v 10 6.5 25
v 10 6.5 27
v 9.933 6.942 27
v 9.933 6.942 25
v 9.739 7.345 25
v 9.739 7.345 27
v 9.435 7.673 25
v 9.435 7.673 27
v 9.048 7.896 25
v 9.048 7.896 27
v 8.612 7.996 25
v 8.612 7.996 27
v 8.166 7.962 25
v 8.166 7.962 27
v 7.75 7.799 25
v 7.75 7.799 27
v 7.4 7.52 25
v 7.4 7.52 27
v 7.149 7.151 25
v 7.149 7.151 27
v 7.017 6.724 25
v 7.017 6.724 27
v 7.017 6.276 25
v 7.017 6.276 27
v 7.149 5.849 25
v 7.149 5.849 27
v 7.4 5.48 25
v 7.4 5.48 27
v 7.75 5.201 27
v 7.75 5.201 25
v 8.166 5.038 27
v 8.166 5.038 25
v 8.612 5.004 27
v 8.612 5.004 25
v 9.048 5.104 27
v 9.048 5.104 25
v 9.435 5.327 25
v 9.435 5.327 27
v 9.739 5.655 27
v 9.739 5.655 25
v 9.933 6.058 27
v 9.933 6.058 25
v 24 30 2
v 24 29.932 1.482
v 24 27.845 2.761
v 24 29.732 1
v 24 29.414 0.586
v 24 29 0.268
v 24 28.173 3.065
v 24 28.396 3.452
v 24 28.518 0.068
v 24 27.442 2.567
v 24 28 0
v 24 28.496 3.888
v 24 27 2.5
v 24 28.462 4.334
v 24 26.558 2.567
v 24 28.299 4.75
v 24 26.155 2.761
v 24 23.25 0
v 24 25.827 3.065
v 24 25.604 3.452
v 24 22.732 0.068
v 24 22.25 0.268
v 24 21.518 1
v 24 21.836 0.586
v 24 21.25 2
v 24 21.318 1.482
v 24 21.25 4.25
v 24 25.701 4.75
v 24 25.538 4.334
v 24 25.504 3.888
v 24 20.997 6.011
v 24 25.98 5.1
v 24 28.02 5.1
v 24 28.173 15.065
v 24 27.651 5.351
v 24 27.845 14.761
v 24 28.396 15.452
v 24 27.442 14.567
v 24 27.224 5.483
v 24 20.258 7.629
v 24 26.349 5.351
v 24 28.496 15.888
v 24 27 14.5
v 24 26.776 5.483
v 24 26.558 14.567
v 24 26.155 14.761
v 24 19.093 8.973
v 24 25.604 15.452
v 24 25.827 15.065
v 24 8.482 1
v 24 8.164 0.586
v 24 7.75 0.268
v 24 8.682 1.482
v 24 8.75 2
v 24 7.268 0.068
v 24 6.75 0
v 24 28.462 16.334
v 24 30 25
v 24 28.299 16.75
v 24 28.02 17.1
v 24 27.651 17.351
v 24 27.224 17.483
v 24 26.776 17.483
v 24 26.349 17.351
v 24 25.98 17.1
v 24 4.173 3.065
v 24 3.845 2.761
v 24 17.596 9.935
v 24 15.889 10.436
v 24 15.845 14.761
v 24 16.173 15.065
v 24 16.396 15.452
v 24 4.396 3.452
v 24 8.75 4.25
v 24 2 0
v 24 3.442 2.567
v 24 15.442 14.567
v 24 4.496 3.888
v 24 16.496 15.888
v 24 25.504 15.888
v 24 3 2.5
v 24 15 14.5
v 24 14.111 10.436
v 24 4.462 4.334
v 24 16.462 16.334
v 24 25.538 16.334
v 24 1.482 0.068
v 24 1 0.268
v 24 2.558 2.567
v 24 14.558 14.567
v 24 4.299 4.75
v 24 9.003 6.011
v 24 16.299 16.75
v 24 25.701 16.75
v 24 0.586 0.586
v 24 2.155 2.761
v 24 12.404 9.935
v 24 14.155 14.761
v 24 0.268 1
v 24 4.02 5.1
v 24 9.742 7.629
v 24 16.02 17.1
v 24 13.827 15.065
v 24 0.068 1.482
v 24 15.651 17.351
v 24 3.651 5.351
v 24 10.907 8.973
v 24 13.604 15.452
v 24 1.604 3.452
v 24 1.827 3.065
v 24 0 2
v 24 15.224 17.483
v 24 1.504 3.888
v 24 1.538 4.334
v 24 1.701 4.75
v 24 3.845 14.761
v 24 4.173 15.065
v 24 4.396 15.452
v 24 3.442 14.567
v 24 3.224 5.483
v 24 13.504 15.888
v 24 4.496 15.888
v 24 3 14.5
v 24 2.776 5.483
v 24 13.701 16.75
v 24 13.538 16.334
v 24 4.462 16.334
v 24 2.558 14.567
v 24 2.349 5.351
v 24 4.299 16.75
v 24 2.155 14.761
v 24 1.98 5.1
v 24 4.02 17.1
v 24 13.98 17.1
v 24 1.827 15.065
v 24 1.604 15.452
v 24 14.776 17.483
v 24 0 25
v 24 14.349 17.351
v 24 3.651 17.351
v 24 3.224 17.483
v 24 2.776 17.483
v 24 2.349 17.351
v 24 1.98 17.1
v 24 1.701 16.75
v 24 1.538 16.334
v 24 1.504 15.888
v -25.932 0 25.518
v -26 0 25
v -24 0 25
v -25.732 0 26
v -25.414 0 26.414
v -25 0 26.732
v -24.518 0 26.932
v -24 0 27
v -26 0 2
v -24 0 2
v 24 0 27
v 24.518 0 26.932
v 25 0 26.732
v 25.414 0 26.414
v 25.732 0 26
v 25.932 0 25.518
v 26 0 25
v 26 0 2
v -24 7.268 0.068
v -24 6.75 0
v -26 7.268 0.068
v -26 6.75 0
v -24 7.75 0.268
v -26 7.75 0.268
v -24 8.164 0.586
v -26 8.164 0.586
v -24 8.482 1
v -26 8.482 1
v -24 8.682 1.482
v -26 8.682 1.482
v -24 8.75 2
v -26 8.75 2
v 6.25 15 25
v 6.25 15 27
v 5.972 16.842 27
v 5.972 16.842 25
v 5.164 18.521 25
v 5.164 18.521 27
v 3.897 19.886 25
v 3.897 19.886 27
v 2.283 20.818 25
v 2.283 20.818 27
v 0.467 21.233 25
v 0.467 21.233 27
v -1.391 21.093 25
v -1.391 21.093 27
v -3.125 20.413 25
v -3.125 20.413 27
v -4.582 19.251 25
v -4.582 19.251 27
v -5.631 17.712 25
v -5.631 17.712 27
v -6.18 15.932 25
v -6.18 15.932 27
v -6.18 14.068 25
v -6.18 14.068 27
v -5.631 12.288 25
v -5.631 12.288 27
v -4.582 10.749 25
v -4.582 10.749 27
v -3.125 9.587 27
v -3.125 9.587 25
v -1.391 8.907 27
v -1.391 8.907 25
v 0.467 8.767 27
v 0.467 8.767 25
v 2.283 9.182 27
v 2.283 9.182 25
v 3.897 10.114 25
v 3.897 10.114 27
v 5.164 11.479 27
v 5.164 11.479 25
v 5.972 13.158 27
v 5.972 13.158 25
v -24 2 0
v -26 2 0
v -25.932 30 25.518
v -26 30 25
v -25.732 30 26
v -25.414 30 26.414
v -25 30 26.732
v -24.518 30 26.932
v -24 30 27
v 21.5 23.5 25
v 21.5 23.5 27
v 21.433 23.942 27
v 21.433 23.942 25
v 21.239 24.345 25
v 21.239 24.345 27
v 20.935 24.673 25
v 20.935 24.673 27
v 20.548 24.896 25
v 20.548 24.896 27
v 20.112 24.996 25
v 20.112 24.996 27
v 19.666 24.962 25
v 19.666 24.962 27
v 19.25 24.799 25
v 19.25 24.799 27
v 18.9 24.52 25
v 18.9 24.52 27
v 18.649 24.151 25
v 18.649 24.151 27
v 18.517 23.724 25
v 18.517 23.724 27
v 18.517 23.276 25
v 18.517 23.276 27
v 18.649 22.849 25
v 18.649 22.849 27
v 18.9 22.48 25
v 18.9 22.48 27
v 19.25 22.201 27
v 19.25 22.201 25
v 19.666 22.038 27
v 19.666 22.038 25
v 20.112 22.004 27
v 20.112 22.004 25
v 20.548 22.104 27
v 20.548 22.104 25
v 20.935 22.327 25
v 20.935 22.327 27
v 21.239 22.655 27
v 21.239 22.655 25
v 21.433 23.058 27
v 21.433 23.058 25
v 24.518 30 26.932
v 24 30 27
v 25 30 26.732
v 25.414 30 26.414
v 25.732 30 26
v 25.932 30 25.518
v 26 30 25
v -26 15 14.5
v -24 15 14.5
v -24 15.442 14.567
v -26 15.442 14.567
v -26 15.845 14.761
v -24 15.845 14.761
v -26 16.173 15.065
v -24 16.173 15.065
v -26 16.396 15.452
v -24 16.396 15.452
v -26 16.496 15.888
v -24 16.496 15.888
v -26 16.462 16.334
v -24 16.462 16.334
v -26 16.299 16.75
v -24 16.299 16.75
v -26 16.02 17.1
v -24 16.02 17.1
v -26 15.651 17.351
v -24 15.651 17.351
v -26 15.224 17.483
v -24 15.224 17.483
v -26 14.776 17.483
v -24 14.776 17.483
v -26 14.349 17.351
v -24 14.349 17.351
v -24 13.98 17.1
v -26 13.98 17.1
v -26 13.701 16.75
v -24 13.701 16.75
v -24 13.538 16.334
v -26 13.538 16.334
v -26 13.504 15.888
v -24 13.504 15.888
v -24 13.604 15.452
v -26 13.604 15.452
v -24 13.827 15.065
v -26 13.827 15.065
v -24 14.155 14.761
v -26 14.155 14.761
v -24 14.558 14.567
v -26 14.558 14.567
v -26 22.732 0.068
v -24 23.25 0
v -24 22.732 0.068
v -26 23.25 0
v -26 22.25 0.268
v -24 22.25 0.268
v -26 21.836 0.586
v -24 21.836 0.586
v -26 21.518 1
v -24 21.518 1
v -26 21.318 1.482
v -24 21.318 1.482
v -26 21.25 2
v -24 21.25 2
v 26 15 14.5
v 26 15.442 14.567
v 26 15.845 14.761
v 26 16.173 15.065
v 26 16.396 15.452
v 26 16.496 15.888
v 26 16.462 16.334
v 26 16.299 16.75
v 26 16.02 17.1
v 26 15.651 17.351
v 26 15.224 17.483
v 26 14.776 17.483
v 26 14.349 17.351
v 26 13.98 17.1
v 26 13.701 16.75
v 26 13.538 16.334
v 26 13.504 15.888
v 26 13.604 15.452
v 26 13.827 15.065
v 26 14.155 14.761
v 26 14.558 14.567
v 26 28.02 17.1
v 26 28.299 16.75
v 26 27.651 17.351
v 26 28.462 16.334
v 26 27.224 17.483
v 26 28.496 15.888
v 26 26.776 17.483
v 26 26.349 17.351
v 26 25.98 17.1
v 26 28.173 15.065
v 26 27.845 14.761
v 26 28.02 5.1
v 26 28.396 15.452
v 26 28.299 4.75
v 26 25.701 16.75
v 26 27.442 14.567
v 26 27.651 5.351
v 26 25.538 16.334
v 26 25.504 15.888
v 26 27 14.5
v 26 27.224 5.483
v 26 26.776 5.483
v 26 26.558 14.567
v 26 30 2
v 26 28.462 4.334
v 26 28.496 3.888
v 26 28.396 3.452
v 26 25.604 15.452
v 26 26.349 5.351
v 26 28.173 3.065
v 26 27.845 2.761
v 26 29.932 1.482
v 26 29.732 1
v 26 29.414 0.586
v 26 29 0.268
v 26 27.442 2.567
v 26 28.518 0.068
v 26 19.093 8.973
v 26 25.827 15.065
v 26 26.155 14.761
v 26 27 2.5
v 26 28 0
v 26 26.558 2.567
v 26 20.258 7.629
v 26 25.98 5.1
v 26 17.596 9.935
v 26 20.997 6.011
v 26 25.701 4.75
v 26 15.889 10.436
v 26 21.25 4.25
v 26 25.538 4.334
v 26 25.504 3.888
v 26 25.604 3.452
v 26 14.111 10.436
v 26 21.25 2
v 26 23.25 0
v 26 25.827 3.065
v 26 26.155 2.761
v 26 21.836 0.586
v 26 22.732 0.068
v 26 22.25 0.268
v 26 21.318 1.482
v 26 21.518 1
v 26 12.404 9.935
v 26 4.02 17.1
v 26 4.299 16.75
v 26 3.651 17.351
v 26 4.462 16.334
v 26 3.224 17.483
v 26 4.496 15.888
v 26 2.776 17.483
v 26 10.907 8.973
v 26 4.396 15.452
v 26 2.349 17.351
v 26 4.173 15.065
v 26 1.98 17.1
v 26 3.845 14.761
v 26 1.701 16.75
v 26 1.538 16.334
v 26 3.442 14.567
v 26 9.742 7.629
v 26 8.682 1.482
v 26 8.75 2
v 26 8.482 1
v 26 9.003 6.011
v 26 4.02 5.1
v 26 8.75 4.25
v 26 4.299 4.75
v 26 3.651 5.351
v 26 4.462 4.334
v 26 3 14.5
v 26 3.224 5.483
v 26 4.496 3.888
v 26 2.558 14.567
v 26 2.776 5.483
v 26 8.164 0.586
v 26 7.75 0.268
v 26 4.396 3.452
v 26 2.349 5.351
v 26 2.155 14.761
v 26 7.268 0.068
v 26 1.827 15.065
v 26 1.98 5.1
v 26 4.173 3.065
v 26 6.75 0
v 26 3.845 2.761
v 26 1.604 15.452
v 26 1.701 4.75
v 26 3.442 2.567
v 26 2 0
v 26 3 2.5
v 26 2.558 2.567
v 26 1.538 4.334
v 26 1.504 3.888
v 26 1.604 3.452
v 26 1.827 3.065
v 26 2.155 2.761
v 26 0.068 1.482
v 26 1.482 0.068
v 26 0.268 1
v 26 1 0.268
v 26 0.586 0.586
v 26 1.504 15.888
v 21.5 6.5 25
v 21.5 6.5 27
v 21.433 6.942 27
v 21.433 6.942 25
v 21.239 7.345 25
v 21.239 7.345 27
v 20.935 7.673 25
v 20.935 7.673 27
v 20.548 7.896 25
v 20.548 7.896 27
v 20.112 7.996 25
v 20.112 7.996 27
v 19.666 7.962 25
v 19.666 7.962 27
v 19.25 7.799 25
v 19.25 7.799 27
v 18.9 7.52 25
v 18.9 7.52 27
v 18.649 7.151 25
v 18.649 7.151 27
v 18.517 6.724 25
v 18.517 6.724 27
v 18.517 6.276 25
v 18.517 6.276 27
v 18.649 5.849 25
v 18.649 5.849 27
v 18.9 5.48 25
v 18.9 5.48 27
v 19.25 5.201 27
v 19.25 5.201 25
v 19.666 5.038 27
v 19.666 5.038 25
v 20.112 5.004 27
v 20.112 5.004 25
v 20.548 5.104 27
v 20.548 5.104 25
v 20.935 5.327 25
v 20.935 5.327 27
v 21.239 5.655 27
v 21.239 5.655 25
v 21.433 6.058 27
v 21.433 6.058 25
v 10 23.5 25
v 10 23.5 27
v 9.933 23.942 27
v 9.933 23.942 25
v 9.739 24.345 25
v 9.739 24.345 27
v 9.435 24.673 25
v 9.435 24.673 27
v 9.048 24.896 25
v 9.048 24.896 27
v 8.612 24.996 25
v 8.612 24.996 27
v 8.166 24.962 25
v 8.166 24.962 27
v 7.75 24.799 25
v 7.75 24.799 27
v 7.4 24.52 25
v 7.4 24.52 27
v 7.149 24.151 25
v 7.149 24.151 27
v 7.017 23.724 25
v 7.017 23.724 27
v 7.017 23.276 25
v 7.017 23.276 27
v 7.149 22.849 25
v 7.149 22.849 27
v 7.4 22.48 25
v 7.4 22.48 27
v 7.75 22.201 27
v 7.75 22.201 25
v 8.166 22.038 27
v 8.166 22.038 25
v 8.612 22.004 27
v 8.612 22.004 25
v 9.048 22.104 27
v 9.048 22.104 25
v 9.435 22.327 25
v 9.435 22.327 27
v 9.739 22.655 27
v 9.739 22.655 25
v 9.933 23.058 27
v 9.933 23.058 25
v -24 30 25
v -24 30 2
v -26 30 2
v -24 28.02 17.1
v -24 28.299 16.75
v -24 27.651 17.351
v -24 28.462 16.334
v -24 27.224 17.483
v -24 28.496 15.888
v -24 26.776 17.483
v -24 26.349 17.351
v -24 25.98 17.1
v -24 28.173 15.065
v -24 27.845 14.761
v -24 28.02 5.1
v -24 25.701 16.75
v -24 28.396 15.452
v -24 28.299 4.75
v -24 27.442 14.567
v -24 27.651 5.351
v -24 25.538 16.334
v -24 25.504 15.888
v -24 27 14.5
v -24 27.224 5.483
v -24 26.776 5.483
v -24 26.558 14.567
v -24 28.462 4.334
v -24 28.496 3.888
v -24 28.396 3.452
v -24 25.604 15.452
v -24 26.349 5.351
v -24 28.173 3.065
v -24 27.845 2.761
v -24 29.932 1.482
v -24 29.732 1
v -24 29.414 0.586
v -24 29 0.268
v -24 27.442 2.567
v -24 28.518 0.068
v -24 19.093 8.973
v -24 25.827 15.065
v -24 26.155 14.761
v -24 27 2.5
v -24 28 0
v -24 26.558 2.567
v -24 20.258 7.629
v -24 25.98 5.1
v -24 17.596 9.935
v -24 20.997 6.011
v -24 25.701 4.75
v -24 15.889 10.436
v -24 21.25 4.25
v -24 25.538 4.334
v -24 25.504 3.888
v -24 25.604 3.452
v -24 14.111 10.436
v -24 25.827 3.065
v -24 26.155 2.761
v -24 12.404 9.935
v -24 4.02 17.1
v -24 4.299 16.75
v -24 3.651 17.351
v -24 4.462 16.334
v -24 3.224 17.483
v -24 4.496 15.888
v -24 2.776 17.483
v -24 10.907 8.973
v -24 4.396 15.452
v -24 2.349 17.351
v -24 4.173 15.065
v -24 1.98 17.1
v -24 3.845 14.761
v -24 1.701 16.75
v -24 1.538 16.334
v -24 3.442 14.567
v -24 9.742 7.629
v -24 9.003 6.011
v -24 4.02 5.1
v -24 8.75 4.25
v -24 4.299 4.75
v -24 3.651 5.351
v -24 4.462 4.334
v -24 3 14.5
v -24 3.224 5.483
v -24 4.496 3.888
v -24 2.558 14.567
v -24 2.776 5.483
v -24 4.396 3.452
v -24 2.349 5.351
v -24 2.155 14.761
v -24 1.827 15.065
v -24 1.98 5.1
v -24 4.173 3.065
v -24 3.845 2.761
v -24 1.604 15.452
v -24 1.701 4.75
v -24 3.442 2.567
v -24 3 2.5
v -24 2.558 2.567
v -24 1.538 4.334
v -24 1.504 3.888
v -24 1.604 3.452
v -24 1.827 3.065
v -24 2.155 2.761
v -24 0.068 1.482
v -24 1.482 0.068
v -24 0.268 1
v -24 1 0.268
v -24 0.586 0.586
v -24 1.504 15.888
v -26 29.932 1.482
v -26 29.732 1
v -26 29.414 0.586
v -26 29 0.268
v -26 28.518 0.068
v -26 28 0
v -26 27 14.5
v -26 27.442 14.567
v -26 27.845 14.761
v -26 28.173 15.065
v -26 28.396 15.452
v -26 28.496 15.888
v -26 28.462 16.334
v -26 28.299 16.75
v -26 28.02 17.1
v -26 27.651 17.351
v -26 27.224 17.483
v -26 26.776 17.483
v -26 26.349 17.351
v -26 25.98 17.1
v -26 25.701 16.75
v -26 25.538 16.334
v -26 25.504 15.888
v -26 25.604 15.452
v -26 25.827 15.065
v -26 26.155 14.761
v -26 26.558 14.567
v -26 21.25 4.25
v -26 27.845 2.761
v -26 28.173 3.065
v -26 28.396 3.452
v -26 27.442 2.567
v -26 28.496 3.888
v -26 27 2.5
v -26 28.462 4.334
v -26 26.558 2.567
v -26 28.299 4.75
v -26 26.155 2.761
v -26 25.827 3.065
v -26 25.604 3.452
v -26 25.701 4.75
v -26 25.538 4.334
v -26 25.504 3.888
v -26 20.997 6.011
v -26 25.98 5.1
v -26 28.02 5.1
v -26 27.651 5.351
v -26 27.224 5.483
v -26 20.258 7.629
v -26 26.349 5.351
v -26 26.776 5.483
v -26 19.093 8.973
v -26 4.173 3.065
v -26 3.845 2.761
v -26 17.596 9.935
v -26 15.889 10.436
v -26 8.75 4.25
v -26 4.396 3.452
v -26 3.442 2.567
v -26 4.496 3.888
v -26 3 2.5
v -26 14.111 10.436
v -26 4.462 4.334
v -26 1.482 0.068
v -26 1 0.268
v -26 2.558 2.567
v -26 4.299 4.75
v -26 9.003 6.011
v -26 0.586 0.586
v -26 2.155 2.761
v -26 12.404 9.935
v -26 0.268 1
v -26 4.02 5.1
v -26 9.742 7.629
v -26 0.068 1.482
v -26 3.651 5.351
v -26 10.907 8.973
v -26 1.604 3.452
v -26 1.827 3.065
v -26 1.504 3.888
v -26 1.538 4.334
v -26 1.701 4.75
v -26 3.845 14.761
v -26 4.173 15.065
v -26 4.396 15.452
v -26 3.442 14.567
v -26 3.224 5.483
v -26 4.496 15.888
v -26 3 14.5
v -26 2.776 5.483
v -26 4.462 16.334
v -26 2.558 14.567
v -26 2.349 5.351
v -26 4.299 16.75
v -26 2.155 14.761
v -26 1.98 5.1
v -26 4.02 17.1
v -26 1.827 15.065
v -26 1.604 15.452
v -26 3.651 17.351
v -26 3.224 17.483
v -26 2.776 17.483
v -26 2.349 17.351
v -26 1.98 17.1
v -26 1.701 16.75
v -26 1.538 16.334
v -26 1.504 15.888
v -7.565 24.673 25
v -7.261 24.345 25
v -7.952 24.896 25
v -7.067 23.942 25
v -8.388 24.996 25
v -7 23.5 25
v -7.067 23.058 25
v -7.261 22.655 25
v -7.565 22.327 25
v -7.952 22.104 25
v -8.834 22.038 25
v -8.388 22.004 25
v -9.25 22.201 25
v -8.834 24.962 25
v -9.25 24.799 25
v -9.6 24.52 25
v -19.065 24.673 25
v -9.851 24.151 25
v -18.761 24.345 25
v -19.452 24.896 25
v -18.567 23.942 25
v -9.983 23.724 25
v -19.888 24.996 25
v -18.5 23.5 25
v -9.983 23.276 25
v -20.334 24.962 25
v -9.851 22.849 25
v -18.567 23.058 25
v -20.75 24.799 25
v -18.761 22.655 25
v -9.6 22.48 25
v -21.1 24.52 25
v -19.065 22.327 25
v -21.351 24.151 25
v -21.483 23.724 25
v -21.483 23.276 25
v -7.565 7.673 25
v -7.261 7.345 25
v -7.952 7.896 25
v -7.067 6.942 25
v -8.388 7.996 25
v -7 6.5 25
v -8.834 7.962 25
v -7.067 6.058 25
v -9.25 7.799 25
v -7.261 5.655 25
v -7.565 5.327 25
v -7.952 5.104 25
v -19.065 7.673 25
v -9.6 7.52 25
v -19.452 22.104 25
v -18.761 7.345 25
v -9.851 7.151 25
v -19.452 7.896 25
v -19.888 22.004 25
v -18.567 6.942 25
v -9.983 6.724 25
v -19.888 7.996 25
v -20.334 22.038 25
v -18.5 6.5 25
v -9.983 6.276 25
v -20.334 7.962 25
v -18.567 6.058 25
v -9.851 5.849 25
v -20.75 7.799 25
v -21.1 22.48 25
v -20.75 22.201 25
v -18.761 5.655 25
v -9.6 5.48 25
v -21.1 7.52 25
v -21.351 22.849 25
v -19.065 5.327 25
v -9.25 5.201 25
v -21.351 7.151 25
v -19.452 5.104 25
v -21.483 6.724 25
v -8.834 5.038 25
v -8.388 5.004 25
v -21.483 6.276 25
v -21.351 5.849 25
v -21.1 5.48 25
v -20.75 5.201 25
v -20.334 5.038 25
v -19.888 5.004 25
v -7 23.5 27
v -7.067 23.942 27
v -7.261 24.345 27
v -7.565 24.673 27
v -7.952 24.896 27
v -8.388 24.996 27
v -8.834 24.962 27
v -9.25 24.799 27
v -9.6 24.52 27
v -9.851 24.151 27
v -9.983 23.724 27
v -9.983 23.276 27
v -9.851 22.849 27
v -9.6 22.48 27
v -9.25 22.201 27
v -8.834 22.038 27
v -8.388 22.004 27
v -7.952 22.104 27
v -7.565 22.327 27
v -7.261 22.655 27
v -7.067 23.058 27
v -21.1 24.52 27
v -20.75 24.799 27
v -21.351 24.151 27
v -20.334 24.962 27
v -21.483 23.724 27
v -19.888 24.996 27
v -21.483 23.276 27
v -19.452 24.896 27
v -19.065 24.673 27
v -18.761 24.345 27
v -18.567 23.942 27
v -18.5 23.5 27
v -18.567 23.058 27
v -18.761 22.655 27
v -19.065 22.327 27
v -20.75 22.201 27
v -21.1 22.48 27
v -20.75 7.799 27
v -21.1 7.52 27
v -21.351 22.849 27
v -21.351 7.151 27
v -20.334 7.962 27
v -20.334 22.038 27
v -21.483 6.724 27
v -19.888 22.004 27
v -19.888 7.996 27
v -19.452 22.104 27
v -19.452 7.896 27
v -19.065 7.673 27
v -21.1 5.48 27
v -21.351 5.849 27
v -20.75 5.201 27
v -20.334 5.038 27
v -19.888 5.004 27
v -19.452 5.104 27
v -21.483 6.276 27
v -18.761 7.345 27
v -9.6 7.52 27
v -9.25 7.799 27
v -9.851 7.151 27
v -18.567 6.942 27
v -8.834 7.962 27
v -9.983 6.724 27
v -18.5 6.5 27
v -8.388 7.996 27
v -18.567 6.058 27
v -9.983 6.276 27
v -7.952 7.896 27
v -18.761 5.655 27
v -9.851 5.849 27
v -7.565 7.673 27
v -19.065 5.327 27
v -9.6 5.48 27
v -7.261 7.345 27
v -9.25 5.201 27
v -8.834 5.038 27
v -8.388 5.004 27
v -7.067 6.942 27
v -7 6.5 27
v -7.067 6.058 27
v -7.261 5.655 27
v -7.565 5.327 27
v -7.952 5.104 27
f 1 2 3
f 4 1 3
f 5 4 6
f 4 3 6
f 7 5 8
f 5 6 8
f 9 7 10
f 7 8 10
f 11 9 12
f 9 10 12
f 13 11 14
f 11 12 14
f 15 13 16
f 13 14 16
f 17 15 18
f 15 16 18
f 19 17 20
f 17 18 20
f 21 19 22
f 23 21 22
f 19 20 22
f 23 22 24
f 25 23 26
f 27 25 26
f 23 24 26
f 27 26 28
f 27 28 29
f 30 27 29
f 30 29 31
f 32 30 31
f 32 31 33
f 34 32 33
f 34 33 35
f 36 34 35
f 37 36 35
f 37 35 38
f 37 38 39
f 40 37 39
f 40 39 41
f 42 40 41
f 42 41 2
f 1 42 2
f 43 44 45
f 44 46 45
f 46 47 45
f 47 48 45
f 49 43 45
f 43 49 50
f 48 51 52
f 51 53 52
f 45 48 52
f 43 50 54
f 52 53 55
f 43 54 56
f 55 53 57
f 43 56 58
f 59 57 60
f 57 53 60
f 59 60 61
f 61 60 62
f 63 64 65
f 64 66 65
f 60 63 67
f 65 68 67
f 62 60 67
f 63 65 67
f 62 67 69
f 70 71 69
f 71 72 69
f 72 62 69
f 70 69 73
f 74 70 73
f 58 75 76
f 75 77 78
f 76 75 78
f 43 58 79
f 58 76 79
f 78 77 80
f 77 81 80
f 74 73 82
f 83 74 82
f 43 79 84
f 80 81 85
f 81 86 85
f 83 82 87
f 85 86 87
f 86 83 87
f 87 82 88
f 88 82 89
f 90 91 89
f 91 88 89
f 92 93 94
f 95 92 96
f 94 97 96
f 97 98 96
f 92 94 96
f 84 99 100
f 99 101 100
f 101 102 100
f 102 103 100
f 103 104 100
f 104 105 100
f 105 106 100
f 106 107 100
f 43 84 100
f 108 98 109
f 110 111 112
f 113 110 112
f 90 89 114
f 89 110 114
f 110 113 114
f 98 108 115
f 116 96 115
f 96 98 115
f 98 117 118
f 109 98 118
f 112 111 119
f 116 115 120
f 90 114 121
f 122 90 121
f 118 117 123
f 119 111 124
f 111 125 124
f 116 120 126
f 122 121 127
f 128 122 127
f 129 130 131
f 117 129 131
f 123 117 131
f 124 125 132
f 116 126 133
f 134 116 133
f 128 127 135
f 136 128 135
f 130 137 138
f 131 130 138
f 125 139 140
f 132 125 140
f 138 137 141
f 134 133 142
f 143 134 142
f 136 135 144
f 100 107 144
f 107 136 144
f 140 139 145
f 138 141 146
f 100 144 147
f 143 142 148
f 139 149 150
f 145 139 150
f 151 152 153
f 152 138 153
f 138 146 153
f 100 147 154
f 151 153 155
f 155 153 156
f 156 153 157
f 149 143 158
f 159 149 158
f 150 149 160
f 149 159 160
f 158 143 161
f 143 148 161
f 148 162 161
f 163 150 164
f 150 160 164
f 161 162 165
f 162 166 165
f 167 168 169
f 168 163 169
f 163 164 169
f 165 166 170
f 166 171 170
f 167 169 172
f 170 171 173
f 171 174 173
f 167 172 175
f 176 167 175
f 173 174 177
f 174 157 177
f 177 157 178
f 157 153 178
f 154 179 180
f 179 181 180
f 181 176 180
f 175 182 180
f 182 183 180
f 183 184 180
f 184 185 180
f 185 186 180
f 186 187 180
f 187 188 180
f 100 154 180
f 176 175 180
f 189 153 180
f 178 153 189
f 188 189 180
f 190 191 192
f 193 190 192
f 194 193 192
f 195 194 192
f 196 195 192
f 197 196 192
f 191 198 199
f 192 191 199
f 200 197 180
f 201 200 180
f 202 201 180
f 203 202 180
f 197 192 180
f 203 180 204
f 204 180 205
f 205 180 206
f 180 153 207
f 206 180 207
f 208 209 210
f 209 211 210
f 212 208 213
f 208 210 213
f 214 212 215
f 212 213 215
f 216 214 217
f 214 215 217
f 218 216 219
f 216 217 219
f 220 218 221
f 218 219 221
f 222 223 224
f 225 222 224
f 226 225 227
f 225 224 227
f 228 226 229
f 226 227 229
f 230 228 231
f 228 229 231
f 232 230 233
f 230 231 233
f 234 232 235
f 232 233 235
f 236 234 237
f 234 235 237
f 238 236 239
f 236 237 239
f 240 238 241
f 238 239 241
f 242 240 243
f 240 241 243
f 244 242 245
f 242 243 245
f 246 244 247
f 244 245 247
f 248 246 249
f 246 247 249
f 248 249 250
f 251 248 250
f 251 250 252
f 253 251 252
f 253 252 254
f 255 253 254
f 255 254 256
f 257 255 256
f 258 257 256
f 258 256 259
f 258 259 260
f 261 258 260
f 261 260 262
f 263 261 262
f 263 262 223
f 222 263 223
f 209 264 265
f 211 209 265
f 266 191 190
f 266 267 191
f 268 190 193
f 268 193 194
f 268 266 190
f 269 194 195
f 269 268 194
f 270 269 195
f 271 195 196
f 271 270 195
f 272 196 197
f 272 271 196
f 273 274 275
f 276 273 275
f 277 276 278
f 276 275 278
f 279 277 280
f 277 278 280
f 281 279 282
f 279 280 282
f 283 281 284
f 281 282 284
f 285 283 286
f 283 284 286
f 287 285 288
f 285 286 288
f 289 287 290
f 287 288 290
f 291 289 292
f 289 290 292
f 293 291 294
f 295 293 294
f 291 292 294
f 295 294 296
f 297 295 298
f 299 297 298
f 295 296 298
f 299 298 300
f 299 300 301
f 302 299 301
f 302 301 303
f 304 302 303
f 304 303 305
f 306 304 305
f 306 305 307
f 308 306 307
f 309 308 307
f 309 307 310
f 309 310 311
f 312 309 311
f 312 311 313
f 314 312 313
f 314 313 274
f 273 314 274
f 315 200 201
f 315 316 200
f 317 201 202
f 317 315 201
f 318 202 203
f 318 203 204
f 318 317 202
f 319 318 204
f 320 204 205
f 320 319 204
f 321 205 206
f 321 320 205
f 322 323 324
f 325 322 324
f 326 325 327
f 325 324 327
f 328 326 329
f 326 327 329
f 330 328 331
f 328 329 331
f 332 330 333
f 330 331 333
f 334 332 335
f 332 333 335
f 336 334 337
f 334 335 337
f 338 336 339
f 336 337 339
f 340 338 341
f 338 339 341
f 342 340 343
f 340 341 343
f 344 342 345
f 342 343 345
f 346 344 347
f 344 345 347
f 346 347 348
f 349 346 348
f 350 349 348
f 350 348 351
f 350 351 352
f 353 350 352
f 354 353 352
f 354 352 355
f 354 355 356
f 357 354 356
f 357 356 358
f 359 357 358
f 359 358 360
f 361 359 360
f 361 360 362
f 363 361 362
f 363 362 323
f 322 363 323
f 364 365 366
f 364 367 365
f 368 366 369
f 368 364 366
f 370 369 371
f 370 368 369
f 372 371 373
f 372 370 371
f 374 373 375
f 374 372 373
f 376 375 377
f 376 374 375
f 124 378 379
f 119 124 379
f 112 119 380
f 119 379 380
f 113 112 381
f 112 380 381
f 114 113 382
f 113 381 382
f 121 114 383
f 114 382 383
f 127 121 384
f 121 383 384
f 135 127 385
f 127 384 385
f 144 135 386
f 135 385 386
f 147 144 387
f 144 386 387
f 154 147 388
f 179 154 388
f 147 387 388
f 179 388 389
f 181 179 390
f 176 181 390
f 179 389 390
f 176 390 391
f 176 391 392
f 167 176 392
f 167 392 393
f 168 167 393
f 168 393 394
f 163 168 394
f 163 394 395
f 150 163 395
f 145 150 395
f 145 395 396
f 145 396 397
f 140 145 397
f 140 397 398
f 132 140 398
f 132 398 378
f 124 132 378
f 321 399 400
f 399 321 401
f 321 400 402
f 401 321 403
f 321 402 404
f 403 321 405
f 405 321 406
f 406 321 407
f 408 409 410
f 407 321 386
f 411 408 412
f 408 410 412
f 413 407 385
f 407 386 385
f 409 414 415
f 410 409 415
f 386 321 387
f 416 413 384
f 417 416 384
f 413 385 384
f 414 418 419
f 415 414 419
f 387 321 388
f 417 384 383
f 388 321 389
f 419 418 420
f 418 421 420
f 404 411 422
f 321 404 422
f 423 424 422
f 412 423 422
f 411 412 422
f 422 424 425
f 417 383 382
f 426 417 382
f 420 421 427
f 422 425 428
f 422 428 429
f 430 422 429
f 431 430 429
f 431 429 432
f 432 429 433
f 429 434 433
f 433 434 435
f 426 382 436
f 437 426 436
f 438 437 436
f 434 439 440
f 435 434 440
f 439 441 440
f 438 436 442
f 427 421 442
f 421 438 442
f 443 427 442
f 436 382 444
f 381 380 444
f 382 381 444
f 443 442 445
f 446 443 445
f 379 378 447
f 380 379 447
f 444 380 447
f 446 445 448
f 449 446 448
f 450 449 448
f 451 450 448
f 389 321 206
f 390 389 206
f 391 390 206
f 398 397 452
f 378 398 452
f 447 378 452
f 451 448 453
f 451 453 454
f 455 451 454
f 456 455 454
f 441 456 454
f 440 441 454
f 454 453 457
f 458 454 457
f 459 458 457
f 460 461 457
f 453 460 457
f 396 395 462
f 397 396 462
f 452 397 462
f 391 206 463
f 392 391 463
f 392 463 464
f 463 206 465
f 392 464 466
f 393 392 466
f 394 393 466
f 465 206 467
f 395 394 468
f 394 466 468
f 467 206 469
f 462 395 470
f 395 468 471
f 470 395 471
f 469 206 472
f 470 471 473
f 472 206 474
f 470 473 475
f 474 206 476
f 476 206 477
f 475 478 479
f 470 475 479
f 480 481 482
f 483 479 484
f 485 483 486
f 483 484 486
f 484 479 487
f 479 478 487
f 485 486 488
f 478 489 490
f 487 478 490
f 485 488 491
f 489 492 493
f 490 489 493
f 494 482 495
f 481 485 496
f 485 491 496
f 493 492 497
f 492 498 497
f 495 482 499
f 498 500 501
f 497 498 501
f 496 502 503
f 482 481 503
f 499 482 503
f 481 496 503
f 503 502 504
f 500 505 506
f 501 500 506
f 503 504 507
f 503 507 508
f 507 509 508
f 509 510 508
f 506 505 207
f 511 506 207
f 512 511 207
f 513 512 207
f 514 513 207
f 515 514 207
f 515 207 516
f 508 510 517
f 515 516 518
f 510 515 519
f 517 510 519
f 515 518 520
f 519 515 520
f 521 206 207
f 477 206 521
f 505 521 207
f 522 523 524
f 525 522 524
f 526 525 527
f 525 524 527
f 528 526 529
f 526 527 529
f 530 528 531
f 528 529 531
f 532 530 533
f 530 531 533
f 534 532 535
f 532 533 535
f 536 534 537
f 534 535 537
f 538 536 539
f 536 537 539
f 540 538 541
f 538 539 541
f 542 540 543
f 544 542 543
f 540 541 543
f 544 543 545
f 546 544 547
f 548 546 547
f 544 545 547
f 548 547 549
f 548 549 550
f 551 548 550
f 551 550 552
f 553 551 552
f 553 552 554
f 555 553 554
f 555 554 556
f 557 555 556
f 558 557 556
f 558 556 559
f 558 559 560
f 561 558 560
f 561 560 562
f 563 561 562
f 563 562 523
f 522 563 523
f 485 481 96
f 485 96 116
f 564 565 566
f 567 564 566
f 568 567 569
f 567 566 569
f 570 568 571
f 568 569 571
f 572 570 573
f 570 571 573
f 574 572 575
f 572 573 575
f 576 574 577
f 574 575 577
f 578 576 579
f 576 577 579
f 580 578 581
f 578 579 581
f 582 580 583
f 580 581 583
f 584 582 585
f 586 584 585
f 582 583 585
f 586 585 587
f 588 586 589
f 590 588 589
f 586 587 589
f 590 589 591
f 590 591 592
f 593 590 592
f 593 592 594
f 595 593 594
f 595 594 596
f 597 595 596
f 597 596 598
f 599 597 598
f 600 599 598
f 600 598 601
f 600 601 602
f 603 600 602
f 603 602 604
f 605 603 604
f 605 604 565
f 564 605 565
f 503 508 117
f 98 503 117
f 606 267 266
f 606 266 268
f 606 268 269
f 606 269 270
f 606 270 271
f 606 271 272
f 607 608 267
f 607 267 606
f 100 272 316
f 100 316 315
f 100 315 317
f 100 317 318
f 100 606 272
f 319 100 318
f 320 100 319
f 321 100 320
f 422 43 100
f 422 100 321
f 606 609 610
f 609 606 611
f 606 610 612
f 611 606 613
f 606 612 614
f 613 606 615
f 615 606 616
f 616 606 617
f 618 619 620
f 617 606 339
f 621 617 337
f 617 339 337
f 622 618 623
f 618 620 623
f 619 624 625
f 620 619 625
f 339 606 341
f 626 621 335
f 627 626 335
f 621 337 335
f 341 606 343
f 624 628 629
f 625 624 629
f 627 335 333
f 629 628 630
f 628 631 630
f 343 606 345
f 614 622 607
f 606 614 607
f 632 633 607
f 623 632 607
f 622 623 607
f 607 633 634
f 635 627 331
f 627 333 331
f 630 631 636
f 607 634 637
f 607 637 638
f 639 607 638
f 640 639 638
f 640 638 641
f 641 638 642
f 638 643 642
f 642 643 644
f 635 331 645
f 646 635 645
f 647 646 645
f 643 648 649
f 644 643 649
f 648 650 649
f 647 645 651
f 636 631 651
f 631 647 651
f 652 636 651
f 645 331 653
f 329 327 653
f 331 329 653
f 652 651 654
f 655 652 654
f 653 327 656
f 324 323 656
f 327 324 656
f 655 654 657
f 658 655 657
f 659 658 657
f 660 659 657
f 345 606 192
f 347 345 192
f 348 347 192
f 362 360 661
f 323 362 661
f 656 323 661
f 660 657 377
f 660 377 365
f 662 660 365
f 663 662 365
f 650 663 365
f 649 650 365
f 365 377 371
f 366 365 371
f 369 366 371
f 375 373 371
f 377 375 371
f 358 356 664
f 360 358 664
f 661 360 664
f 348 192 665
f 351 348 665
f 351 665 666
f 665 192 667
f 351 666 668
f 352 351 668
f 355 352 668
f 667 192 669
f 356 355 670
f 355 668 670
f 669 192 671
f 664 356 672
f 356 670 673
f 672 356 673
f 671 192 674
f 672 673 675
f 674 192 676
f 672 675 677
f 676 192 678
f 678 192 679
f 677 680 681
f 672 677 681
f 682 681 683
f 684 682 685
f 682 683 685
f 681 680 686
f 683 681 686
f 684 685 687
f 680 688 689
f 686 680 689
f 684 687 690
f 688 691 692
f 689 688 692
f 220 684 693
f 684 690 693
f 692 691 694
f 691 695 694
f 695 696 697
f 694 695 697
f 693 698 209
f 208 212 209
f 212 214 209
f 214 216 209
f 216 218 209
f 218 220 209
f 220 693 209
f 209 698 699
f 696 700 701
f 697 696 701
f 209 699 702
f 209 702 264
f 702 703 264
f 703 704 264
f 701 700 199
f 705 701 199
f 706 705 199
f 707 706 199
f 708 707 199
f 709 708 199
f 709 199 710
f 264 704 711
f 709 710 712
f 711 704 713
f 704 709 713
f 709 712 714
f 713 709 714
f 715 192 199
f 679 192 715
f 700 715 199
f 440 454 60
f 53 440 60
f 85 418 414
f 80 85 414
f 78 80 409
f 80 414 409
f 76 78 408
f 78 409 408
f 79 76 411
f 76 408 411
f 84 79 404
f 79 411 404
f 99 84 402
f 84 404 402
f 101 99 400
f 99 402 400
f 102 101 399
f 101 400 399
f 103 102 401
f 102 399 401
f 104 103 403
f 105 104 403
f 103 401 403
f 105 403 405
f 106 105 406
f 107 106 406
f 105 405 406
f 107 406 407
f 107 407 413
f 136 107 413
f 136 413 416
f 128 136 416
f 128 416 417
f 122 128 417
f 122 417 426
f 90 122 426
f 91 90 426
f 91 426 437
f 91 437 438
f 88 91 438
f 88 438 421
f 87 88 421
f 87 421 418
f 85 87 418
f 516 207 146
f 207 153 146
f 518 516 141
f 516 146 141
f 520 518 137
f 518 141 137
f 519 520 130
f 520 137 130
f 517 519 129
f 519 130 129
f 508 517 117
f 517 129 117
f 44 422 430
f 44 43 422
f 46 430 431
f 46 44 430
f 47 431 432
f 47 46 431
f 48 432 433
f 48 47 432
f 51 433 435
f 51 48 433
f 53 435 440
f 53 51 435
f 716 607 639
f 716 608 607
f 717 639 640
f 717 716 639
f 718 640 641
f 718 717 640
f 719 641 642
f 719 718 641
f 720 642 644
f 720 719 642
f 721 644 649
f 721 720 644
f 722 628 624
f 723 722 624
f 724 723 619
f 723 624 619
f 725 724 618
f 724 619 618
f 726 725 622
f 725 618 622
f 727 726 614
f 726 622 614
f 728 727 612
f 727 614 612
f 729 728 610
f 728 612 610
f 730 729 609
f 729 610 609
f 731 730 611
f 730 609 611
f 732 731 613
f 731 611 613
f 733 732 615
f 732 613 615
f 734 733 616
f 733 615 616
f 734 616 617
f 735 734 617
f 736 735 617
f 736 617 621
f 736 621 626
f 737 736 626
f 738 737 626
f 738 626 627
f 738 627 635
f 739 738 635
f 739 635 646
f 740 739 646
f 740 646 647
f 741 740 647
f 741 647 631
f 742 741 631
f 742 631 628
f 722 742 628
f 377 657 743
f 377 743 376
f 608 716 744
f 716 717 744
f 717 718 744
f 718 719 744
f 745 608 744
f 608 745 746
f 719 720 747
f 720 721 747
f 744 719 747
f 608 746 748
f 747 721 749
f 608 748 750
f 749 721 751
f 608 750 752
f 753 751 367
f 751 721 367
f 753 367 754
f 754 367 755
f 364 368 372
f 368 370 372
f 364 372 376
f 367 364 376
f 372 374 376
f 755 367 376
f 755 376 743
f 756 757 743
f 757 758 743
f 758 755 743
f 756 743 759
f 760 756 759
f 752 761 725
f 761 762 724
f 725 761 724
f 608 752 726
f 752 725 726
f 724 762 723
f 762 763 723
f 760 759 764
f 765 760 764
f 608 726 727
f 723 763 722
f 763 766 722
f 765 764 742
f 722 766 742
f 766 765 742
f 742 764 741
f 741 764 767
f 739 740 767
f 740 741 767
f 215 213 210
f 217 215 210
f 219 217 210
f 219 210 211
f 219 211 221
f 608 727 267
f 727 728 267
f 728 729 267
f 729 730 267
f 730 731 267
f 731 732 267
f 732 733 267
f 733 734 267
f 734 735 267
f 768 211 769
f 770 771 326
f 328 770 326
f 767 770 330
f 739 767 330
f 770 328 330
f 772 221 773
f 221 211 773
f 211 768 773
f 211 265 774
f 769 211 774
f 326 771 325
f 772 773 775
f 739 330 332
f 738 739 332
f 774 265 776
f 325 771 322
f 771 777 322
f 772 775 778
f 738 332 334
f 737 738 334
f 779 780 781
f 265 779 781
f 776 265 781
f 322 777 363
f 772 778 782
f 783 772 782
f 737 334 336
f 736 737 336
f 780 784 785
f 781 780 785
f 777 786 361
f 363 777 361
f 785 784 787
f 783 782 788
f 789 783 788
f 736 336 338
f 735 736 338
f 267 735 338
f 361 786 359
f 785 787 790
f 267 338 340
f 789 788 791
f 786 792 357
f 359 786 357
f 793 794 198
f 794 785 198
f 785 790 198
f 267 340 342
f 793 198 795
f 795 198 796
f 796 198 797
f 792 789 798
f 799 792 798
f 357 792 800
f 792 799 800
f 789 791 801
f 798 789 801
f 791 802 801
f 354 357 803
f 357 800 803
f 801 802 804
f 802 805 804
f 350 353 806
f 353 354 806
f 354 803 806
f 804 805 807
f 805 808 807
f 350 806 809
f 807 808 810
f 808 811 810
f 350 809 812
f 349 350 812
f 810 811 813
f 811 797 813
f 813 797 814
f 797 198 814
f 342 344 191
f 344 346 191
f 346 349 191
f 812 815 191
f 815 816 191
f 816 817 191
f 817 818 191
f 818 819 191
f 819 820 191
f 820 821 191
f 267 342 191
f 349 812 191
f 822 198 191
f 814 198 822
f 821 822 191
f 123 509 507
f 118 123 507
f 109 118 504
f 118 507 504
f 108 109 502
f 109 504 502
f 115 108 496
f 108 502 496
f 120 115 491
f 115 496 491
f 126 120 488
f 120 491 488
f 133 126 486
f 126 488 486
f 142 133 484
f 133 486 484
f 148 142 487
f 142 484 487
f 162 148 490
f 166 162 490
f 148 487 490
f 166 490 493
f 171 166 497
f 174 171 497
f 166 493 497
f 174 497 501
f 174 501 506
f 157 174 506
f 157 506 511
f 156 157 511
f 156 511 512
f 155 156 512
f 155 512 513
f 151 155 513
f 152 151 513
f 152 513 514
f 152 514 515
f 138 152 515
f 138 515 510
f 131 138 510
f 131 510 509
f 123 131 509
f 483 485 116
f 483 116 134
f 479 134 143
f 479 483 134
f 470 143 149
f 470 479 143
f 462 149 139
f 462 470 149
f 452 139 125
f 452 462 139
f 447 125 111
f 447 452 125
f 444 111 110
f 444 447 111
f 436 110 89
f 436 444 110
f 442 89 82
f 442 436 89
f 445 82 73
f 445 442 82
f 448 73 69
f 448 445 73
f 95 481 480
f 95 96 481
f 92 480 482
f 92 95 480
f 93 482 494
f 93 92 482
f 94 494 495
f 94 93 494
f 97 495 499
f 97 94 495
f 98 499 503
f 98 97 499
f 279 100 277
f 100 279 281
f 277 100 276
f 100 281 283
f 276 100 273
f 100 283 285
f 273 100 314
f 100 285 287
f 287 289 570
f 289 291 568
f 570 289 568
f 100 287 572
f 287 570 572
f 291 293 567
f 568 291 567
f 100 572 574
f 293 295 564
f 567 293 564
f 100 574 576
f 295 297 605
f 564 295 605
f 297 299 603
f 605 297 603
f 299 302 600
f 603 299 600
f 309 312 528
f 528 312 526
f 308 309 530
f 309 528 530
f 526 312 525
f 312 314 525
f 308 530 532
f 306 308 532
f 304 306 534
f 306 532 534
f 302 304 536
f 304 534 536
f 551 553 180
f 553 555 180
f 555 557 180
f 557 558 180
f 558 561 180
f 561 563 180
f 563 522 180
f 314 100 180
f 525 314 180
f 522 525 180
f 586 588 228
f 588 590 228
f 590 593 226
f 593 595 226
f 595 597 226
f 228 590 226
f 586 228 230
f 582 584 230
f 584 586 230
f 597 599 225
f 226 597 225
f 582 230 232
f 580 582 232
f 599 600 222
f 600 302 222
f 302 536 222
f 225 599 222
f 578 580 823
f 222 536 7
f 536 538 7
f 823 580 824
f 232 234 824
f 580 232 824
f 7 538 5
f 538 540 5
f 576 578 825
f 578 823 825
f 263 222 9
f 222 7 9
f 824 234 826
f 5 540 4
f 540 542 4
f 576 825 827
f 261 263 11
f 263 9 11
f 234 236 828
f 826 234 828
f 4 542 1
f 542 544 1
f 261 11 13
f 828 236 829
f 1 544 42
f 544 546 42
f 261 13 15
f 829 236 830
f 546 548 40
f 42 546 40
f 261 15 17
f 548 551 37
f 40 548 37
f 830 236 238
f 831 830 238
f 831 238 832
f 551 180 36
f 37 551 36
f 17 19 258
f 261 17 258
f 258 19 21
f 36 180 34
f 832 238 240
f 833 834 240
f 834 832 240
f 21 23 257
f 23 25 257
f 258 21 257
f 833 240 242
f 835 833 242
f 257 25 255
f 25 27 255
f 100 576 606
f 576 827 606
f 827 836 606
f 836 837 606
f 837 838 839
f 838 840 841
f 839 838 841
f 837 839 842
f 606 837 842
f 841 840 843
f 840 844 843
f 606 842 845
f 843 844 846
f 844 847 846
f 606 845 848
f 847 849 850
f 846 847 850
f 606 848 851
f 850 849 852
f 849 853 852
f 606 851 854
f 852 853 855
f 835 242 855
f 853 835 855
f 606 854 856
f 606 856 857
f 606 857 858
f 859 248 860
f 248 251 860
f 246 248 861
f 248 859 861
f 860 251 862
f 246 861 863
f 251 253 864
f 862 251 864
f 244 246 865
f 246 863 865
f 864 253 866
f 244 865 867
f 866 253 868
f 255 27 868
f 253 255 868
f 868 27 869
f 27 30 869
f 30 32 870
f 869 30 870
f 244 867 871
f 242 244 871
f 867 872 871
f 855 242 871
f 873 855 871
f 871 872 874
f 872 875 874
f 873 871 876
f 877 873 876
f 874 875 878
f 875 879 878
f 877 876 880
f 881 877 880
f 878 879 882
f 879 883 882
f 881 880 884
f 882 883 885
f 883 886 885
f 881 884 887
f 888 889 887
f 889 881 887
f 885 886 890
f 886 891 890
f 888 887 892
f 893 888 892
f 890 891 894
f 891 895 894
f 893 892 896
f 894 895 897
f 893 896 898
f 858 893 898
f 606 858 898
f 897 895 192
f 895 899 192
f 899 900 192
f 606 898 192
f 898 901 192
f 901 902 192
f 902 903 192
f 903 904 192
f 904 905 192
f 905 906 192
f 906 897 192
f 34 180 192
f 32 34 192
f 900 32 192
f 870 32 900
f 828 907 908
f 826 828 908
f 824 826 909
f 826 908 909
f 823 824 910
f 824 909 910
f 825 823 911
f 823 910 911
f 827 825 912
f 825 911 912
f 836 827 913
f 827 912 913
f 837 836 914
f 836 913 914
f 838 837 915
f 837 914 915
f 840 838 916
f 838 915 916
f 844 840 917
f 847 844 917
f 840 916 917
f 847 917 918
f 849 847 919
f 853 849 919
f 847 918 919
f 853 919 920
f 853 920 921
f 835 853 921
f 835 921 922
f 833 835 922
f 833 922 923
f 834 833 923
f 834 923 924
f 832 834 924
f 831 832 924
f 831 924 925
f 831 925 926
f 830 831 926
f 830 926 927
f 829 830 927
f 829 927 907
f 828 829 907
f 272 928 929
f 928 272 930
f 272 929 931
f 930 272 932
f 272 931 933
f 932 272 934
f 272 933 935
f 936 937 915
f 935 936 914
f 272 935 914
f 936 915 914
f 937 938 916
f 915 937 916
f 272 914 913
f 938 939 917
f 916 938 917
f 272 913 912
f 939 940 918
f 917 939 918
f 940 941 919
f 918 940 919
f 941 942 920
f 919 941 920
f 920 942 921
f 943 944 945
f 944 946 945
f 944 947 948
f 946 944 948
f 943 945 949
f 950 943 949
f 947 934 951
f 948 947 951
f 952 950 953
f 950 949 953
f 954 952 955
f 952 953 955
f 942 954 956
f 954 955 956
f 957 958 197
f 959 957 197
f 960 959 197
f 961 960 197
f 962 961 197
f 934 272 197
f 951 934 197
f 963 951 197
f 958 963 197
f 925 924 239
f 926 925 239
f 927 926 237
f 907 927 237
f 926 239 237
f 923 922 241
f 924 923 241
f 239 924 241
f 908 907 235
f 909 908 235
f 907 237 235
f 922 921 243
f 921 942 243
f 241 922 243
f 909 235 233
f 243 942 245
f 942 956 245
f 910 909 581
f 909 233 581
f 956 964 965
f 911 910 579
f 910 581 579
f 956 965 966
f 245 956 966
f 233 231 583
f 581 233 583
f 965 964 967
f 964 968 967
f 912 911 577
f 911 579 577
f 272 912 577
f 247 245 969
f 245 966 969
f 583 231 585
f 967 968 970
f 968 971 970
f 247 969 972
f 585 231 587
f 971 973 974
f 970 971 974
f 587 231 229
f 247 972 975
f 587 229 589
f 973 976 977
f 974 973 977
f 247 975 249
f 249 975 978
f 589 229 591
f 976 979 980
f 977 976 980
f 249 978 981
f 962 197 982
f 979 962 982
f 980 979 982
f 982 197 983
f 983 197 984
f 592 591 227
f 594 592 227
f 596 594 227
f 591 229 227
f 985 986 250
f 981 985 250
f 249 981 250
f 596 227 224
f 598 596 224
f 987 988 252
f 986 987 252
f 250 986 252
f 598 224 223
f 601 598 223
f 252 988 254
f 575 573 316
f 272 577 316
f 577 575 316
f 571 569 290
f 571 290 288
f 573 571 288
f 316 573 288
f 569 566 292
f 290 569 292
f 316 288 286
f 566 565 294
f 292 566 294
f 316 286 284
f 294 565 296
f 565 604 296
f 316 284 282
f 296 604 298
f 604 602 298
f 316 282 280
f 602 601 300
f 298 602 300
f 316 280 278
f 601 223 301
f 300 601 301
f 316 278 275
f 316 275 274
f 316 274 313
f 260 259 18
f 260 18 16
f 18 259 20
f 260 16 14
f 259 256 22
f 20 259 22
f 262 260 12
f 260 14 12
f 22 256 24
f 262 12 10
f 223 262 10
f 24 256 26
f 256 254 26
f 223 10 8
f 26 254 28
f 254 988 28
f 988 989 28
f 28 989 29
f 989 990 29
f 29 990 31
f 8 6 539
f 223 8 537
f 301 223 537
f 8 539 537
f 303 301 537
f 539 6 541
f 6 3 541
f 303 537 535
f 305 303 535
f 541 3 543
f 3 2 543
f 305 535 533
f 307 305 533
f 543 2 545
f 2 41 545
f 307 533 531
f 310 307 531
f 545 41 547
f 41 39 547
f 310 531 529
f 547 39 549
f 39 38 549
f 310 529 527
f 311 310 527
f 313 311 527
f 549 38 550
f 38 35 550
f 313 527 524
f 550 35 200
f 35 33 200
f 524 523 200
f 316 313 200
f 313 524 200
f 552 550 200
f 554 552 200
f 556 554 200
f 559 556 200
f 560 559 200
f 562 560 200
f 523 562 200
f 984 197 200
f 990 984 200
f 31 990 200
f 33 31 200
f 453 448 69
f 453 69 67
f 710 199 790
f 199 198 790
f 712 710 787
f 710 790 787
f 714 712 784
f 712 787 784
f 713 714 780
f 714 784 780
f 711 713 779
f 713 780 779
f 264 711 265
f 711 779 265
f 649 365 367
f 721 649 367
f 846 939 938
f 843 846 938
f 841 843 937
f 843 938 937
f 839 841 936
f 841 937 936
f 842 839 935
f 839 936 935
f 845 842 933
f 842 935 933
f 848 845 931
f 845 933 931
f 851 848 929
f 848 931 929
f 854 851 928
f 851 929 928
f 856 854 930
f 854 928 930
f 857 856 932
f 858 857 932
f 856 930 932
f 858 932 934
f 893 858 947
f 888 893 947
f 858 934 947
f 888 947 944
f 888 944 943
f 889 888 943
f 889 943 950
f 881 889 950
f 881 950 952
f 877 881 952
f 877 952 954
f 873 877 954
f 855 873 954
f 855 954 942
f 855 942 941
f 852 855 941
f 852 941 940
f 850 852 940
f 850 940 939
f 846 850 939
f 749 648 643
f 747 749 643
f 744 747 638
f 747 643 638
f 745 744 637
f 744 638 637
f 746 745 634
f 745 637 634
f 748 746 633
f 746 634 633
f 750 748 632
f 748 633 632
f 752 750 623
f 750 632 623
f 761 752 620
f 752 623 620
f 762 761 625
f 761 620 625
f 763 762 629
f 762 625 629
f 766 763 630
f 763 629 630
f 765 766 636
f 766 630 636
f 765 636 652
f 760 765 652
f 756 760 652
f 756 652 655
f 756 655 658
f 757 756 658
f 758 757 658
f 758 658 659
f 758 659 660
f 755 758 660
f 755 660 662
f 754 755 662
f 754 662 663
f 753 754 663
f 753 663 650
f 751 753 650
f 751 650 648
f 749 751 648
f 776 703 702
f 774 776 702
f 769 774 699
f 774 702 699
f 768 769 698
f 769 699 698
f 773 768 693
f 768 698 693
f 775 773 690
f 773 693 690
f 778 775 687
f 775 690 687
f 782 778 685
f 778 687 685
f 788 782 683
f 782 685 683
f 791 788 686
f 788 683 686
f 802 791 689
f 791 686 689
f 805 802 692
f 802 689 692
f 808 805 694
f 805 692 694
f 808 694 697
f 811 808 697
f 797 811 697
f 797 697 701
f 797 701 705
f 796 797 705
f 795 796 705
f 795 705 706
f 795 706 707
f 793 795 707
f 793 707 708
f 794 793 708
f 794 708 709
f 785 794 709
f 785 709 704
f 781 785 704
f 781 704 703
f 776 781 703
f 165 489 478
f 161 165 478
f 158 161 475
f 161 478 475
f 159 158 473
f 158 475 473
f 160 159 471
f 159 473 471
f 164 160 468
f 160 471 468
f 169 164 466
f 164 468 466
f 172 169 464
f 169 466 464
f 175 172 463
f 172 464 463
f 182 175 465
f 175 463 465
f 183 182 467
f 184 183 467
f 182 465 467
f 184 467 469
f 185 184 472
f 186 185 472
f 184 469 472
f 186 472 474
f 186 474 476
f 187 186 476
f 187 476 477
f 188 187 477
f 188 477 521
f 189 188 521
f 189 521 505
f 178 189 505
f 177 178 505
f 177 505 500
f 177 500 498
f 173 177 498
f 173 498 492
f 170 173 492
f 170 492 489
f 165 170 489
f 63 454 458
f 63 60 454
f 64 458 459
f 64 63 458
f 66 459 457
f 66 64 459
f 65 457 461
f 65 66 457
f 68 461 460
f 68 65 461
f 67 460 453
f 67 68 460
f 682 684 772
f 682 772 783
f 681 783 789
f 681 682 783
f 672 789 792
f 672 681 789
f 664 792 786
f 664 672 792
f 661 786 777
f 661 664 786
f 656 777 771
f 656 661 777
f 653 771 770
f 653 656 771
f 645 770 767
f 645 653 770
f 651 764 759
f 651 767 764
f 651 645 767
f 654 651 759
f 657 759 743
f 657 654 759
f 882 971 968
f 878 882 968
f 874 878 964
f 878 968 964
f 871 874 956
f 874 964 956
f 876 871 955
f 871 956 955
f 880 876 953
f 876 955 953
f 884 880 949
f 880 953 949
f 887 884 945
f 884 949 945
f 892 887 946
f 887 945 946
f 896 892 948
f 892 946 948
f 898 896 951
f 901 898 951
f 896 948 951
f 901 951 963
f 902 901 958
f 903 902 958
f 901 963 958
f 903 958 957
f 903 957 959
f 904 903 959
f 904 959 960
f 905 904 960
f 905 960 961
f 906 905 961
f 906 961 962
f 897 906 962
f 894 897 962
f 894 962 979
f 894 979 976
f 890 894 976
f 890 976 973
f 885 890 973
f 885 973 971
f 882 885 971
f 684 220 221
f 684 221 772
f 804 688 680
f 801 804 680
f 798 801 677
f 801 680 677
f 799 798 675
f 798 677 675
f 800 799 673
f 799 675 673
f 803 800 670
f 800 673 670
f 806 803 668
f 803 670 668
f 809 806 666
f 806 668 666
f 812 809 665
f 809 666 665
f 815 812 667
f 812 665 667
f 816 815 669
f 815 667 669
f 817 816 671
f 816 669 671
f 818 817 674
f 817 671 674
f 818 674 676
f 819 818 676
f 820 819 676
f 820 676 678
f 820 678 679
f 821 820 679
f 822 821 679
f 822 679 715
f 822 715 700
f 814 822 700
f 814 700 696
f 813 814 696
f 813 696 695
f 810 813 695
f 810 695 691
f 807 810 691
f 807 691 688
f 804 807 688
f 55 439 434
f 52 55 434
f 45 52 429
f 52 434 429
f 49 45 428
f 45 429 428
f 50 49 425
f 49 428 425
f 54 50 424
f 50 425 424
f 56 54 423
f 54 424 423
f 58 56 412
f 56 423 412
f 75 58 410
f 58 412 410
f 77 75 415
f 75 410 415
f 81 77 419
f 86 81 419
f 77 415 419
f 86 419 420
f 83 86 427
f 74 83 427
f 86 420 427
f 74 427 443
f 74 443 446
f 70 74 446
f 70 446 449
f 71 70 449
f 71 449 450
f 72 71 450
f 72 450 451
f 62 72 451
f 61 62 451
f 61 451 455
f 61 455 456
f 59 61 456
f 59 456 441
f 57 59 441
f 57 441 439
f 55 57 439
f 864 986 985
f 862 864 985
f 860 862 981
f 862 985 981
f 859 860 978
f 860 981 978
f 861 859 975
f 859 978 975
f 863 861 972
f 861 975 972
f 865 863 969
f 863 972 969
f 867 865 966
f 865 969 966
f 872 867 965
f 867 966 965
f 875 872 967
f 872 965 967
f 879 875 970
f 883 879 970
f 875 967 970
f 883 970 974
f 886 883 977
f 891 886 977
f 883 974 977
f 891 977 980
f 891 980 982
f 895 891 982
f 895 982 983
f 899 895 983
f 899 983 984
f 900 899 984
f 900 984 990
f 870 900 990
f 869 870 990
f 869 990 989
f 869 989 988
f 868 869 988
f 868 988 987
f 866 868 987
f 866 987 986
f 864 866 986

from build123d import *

# Parameters (mm, degrees)
BOSS_EXTRUDE1_DEPTH = 30
SKETCH2_R           = 1.5
CUT_EXTRUDE1_DEPTH  = 53
SKETCH3_R           = 6.25
SKETCH3_R_2         = 1.5
CUT_EXTRUDE2_DEPTH  = 30
FILLET1_R           = 2


with BuildPart() as part:
    # Sketch1 → Boss-Extrude1 (new body)
    with BuildSketch(Plane(origin=(0, 0, 0), x_dir=(1, 0, 0), z_dir=(0, 1, 0))):
        Polygon((24, 0), (24, -25), (-24, -25), (-24, 0), (-26, 0), (-26, -27), (26, -27), (26, 0), align=None)
    extrude(amount=BOSS_EXTRUDE1_DEPTH)

    # Sketch2 → Cut-Extrude1 (cut, through all)
    with BuildSketch(Plane(origin=(26, 0, 0), x_dir=(0, 0, -1), z_dir=(1, 0, 0))):
        with Locations((-4, 27)):
            Circle(SKETCH2_R)
        with Locations((-4, 3)):
            Circle(SKETCH2_R)
        with Locations((-16, 15)):
            Circle(SKETCH2_R)
        with Locations((-16, 27)):
            Circle(SKETCH2_R)
        with Locations((-16, 3)):
            Circle(SKETCH2_R)
        with BuildLine():
            Line((-4.25, 21.25), (0, 21.25))
            Line((0, 21.25), (0, 8.75))
            Line((0, 8.75), (-4.25, 8.75))
            ThreePointArc((-4.25, 8.75), (-10.5, 15), (-4.25, 21.25))
        make_face()
    extrude(amount=-CUT_EXTRUDE1_DEPTH, mode=Mode.SUBTRACT)

    # Sketch3 → Cut-Extrude2 (cut)
    with BuildSketch(Plane.XY.offset(27)):
        with Locations((0, 15)):
            Circle(SKETCH3_R)
        with Locations((20, 23.5)):
            Circle(SKETCH3_R_2)
        with Locations((20, 6.5)):
            Circle(SKETCH3_R_2)
        with Locations((8.5, 6.5)):
            Circle(SKETCH3_R_2)
        with Locations((8.5, 23.5)):
            Circle(SKETCH3_R_2)
        with Locations((-8.5, 6.5)):
            Circle(SKETCH3_R_2)
        with Locations((-20, 6.5)):
            Circle(SKETCH3_R_2)
        with Locations((-8.5, 23.5)):
            Circle(SKETCH3_R_2)
        with Locations((-20, 23.5)):
            Circle(SKETCH3_R_2)
    extrude(amount=-CUT_EXTRUDE2_DEPTH, mode=Mode.SUBTRACT)

    # Fillet1
    fillet1_edges = [part.edges().sort_by_distance(p)[0] for p in [
        (25, 0, 0),
        (26, 15, 27),
        (-26, 15, 27),
        (-25, 30, 0),
        (25, 30, 0),
        (25, 21.25, 0),
        (-25, 21.25, 0),
        (25, 8.75, 0),
        (-25, 8.75, 0),
        (-25, 0, 0),
    ]]
    fillet(fillet1_edges, radius=FILLET1_R)


solid = part.part
